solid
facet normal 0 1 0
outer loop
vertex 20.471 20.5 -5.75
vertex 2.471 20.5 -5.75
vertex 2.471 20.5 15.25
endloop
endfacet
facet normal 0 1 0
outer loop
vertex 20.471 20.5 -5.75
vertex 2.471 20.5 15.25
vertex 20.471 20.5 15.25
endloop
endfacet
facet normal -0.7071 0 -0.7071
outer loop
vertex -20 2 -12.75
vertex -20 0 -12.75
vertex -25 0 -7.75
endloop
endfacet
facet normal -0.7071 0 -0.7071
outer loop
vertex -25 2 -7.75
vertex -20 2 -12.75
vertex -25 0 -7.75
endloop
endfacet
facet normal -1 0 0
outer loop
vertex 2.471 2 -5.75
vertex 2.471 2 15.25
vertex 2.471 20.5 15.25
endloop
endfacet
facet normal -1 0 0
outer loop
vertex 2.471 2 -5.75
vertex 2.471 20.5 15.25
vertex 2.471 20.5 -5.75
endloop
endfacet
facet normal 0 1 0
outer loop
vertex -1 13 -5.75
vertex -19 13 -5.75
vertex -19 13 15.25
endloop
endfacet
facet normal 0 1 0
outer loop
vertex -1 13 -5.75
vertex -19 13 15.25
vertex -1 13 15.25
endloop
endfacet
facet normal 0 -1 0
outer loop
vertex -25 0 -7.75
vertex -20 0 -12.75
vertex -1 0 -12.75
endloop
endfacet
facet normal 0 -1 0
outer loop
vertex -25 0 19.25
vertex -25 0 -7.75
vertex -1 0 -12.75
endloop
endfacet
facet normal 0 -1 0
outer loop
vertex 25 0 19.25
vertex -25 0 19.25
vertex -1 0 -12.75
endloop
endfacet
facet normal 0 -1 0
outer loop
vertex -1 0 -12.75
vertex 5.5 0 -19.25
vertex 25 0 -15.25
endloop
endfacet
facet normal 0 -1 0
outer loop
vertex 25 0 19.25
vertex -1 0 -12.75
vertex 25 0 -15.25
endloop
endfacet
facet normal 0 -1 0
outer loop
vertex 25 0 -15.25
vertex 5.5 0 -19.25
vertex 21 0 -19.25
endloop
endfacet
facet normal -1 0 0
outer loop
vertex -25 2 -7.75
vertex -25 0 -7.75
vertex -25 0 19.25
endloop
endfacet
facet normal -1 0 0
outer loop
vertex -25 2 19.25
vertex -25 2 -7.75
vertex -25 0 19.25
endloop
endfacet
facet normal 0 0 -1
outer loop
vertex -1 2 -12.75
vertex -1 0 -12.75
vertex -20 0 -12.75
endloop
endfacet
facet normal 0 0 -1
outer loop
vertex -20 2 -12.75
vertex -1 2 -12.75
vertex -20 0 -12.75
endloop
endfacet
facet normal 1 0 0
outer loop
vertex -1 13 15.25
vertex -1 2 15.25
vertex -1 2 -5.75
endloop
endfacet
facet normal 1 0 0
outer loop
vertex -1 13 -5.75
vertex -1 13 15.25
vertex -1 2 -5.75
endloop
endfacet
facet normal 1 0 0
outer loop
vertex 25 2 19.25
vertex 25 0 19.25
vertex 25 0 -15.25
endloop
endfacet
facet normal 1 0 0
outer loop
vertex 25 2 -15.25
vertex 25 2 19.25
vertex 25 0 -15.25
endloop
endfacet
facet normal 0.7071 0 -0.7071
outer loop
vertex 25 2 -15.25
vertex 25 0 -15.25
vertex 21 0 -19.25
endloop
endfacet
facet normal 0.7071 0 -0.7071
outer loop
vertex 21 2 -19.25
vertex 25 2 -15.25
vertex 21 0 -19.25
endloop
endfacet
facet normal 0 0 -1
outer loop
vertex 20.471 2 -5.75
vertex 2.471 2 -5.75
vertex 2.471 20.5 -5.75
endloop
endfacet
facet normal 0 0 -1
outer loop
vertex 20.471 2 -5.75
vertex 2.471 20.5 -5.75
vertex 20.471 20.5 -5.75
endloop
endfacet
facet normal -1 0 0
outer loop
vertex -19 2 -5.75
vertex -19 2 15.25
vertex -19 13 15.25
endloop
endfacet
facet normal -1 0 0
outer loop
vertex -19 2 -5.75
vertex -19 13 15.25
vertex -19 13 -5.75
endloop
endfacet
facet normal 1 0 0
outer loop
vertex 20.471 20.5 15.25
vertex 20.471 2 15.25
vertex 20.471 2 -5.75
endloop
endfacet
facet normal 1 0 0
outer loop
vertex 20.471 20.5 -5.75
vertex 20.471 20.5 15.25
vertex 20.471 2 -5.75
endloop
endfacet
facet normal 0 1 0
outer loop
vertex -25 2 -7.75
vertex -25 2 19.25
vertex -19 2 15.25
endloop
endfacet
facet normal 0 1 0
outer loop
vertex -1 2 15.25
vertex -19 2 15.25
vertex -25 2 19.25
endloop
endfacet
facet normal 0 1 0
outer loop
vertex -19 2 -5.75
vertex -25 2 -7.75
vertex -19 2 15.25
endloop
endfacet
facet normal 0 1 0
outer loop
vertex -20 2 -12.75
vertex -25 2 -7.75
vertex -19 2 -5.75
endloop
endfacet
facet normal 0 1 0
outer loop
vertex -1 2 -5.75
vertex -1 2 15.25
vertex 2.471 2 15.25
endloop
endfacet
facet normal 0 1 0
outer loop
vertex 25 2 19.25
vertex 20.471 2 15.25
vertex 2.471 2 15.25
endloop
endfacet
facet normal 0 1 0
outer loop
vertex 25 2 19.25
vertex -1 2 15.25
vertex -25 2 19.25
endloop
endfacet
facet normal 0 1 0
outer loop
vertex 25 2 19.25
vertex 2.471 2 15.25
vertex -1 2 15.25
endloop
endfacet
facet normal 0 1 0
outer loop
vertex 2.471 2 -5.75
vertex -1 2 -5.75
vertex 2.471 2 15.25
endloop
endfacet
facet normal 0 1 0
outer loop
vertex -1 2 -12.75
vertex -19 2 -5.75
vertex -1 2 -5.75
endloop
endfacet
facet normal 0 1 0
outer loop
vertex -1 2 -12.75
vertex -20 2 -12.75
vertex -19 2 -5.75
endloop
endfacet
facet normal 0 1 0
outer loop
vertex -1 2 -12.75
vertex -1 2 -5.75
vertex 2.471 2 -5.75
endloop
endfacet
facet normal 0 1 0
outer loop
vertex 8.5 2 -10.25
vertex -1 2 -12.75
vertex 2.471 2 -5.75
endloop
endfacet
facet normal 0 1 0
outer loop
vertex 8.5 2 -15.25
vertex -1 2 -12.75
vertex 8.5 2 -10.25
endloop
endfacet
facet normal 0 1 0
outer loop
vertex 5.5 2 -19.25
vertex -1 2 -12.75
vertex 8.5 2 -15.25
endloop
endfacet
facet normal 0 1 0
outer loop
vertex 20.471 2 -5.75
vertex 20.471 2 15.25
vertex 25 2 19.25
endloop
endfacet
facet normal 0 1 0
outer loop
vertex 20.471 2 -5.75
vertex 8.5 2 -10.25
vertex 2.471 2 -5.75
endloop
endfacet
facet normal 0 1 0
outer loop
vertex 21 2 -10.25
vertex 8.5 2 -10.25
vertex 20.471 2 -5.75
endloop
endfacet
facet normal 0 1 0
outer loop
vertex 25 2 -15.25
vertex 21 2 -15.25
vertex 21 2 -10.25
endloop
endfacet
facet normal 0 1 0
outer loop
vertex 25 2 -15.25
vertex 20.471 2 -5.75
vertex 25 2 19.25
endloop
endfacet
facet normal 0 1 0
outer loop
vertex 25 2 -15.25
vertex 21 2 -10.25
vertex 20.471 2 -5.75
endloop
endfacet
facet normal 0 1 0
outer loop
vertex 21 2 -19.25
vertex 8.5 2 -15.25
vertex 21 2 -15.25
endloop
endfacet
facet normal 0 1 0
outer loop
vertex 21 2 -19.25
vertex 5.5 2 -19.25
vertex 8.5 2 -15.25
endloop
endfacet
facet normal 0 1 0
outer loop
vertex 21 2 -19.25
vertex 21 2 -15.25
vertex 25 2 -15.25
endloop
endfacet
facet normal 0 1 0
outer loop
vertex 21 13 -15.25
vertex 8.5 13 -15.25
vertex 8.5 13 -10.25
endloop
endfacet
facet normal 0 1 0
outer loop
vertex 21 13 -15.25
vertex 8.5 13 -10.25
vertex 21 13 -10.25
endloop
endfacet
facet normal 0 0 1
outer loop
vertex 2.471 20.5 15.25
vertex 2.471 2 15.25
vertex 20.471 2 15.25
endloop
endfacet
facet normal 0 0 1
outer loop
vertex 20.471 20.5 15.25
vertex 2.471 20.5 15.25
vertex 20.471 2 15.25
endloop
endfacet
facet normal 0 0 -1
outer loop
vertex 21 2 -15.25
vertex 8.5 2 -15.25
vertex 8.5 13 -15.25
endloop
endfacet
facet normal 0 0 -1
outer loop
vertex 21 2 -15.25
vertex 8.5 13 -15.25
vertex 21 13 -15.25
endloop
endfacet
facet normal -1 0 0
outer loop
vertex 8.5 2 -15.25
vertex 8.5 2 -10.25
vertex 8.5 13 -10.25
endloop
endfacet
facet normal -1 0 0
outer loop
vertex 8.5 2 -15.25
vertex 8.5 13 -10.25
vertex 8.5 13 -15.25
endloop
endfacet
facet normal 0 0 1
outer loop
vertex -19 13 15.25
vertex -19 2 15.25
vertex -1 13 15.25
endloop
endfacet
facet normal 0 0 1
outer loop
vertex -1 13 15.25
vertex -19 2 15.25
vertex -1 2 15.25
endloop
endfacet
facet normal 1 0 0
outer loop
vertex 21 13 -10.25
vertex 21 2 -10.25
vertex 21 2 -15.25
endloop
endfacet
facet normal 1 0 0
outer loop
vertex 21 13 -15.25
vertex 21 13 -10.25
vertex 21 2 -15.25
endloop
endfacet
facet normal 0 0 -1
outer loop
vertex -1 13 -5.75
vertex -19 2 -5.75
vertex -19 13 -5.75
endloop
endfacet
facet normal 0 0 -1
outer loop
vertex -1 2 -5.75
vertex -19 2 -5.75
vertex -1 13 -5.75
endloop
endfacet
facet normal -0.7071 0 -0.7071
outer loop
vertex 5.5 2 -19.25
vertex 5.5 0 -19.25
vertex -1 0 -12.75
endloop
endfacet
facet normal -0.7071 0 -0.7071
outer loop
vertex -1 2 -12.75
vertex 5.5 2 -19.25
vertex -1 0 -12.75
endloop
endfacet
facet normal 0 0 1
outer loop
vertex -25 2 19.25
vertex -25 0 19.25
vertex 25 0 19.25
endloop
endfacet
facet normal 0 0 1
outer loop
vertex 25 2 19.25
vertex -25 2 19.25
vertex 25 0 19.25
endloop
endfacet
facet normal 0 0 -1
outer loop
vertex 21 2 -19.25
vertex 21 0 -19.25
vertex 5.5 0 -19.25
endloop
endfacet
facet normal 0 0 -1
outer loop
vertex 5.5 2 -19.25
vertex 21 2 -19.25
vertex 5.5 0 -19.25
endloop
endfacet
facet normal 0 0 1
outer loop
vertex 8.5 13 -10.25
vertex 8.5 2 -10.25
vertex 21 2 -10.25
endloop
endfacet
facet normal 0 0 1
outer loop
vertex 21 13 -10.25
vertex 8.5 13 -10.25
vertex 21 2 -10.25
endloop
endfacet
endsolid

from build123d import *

# Parameters (mm, degrees)
BOSS_EXTRUDE1_DEPTH = 2
SKETCH2_W           = 18
SKETCH2_H           = 21
BOSS_EXTRUDE2_DEPTH = 11
SKETCH3_W           = 18
SKETCH3_H           = 21
BOSS_EXTRUDE3_DEPTH = 18.5
SKETCH4_W           = 12.5
SKETCH4_H           = 5
BOSS_EXTRUDE4_DEPTH = 11


with BuildPart() as part:
    # Sketch1 → Boss-Extrude1 (new body)
    with BuildSketch(Plane(origin=(0, 0, 0), x_dir=(1, 0, 0), z_dir=(0, 1, 0))):
        Polygon((-1, 12.75), (-20, 12.75), (-25, 7.75), (-25, -19.25), (25, -19.25), (25, 15.25), (21, 19.25), (5.5, 19.25), align=None)
    extrude(amount=BOSS_EXTRUDE1_DEPTH)

    # Sketch2 → Boss-Extrude2 (add)
    with BuildSketch(Plane(origin=(0, 2, 0), x_dir=(1, 0, 0), z_dir=(0, 1, 0))):
        with Locations((-10, -4.75)):
            Rectangle(SKETCH2_W, SKETCH2_H)
    extrude(amount=BOSS_EXTRUDE2_DEPTH)

    # Sketch3 → Boss-Extrude3 (add)
    with BuildSketch(Plane(origin=(0, 2, 0), x_dir=(1, 0, 0), z_dir=(0, 1, 0))):
        with Locations((11.471056506, -4.75)):
            Rectangle(SKETCH3_W, SKETCH3_H)
    extrude(amount=BOSS_EXTRUDE3_DEPTH)

    # Sketch4 → Boss-Extrude4 (add)
    with BuildSketch(Plane(origin=(0, 2, 0), x_dir=(1, 0, 0), z_dir=(0, 1, 0))):
        with Locations((14.75, 12.75)):
            Rectangle(SKETCH4_W, SKETCH4_H)
    extrude(amount=BOSS_EXTRUDE4_DEPTH)


solid = part.part
